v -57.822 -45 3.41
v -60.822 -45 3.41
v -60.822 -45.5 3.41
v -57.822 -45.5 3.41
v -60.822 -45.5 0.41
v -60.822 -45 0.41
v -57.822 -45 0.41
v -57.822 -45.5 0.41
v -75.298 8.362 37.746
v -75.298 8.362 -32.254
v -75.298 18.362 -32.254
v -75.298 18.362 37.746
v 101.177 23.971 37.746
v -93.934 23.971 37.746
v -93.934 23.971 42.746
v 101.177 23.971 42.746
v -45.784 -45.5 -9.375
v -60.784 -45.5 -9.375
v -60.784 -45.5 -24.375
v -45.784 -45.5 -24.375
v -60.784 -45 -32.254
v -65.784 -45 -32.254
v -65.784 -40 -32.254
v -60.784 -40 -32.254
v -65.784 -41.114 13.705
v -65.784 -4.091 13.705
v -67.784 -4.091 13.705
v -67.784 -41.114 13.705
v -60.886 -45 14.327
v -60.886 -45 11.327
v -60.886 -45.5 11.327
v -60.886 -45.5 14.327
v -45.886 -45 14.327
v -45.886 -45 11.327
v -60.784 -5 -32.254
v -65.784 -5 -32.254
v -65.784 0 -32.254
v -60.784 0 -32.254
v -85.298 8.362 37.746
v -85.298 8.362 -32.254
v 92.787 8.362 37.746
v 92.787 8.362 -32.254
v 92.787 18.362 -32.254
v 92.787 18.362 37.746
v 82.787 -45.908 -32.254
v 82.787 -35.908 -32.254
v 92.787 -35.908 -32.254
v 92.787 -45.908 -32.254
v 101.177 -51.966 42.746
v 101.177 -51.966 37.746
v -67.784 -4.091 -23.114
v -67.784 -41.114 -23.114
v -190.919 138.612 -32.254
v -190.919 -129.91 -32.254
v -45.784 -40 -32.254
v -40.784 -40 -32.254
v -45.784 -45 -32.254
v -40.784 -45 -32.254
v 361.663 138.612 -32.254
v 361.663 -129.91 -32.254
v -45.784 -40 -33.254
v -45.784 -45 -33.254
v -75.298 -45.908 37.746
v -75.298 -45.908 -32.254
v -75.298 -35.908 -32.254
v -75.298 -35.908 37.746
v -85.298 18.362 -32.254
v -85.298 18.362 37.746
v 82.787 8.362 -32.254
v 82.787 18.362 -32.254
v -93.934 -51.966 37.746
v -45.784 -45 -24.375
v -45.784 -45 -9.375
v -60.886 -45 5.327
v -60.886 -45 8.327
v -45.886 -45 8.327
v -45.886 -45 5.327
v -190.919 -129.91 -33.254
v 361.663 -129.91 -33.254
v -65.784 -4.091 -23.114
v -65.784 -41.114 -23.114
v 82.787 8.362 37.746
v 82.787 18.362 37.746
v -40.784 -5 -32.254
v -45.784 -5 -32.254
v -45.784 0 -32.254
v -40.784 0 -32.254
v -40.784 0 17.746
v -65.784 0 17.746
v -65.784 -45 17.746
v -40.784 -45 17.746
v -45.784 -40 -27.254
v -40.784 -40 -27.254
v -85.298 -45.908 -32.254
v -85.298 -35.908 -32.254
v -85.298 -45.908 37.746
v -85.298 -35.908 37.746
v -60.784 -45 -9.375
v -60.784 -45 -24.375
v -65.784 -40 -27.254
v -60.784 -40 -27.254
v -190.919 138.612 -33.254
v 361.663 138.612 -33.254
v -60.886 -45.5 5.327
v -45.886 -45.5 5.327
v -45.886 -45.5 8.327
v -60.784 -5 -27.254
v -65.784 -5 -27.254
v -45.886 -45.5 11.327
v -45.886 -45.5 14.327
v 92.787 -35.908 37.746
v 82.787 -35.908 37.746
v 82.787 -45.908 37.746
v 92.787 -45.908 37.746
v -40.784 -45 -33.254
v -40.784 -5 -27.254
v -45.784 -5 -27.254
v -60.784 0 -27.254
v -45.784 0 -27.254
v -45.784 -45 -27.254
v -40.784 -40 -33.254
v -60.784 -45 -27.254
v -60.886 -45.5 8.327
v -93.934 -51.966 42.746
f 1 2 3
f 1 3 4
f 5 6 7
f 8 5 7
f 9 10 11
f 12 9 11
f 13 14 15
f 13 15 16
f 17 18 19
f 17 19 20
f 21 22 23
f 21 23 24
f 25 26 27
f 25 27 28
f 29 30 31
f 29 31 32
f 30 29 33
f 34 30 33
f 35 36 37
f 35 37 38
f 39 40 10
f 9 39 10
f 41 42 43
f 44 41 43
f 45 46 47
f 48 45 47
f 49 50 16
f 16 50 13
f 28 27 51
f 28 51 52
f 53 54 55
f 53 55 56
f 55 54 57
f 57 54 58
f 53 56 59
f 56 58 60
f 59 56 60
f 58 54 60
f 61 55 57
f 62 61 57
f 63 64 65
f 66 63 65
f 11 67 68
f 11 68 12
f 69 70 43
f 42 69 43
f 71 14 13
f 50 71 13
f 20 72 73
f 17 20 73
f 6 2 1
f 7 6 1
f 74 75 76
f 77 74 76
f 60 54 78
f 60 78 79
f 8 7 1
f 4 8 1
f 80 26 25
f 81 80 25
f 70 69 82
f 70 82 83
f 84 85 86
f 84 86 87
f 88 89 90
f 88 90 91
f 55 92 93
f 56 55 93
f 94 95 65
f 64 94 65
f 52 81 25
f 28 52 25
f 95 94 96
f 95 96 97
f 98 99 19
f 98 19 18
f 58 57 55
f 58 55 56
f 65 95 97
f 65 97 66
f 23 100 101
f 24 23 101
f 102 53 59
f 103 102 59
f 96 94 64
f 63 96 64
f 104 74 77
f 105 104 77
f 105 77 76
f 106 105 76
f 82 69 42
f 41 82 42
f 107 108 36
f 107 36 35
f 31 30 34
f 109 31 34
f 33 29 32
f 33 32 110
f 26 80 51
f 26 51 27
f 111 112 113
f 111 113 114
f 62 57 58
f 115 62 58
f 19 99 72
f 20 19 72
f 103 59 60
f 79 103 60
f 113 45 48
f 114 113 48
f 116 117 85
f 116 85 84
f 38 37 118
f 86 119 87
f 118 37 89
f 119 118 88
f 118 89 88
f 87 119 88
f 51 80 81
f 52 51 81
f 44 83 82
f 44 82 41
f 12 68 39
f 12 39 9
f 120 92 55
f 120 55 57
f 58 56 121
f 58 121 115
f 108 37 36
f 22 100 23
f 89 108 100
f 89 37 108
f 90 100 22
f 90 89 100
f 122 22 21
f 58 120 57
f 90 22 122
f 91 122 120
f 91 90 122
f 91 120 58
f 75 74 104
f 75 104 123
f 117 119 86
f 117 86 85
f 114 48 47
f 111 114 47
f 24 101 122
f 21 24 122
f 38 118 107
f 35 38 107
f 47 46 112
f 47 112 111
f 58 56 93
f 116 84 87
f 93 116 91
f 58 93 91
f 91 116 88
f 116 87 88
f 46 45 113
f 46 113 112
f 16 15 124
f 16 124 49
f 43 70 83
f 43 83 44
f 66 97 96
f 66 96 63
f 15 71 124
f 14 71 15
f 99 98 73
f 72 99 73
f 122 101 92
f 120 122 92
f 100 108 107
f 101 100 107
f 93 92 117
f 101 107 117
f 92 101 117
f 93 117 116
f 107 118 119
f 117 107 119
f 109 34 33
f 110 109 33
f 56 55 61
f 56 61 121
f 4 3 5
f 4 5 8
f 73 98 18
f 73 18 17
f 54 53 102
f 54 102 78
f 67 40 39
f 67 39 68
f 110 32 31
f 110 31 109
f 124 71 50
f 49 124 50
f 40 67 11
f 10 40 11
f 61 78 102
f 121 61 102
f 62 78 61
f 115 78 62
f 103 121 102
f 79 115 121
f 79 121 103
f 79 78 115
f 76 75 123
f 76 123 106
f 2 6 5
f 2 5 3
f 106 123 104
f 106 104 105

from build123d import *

# Parameters (mm, degrees)
F0_W      = 25
F0_H      = 45
F1_DEPTH  = 45
F2_W      = 37.02273
F2_H      = 36.818184
F3_DEPTH  = 2
F4_W      = 15
F4_H      = 3
F5_DEPTH  = 0.5
F6_W      = 15
F6_H      = 15
F7_DEPTH  = 0.5
F8_W      = 3
F8_H      = 3
F9_DEPTH  = 0.5
F11_W     = 5
F11_H     = 5
F12_DEPTH = 5
F13_W     = 552.581966
F13_H     = 268.521279
F13_W_2   = 5
F13_H_2   = 5
F14_DEPTH = 1
F15_W     = 10
F15_H     = 10
F16_DEPTH = 70
F17_W     = 195.110477
F17_H     = 75.93685
F18_DEPTH = 5


with BuildPart() as f1:
    # F0 (on Front) → F1 (new body)
    with BuildSketch(Plane.XZ):
        with Locations((-53.284094, -4.754224)):
            Rectangle(F0_W, F0_H)
    extrude(amount=F1_DEPTH)

    # F11 (on face) → F12 (join)
    with BuildSketch(Plane(origin=(0, 0, -27.254224), x_dir=(1, 0, 0), z_dir=(0, 0, -1))):
        with Locations((-63.284094, 42.5)):
            Rectangle(F11_W, F11_H)
        with Locations((-43.284094, 42.5)):
            Rectangle(F11_W, F11_H)
        with Locations((-63.284094, 2.5)):
            Rectangle(F11_W, F11_H)
        with Locations((-43.284094, 2.5)):
            Rectangle(F11_W, F11_H)
    extrude(amount=F12_DEPTH)


with BuildPart() as f3:
    # F2 (on face) → F3 (new body)
    with BuildSketch(Plane(origin=(-65.784094, 0, 0), x_dir=(0, -1, 0), z_dir=(-1, 0, 0))):
        with Locations((22.602276, -4.704546)):
            Rectangle(F2_W, F2_H)
    extrude(amount=F3_DEPTH)


with BuildPart() as f5:
    # F4 (on face) → F5 (new body)
    with BuildSketch(Plane.XZ.offset(45)):
        with Locations((-53.386366, 12.826705)):
            Rectangle(F4_W, F4_H)
        with Locations((-53.386366, 6.826706)):
            Rectangle(F4_W, F4_H)
    extrude(amount=F5_DEPTH)


with BuildPart() as f7:
    # F6 (on face) → F7 (new body)
    with BuildSketch(Plane.XZ.offset(45)):
        with Locations((-53.284094, -16.875001)):
            Rectangle(F6_W, F6_H)
    extrude(amount=F7_DEPTH)


with BuildPart() as f9:
    # F8 (on face) → F9 (new body)
    with BuildSketch(Plane.XZ.offset(45)):
        with Locations((-59.321633, 1.909961)):
            Rectangle(F8_W, F8_H)
    extrude(amount=F9_DEPTH)


with BuildPart() as f14:
    # F13 (on face) → F14 (new body)
    with BuildSketch(Plane(origin=(0, 0, -32.254224), x_dir=(1, 0, 0), z_dir=(0, 0, -1))):
        with Locations((85.371703, -4.351034)):
            Rectangle(F13_W, F13_H)
        with Locations((-43.284094, 42.5)):
            Rectangle(F13_W_2, F13_H_2, mode=Mode.SUBTRACT)
    extrude(amount=F14_DEPTH)


with BuildPart() as f16:
    # F15 (on face) → F16 (new body)
    with BuildSketch(Plane.XY.offset(-32.254224)):
        with Locations((-80.297943, 13.362299)):
            Rectangle(F15_W, F15_H)
        with Locations((87.787208, 13.362299)):
            Rectangle(F15_W, F15_H)
        with Locations((-80.297943, -40.907661)):
            Rectangle(F15_W, F15_H)
        with Locations((87.787208, -40.907661)):
            Rectangle(F15_W, F15_H)
    extrude(amount=F16_DEPTH)


with BuildPart() as f18:
    # F17 (on face) → F18 (new body)
    with BuildSketch(Plane.XY.offset(37.745776)):
        with Locations((3.621507, -13.997344)):
            Rectangle(F17_W, F17_H)
    extrude(amount=F18_DEPTH)


solid = Compound([f1.part, f3.part, f5.part, f7.part, f9.part, f14.part, f16.part, f18.part])
